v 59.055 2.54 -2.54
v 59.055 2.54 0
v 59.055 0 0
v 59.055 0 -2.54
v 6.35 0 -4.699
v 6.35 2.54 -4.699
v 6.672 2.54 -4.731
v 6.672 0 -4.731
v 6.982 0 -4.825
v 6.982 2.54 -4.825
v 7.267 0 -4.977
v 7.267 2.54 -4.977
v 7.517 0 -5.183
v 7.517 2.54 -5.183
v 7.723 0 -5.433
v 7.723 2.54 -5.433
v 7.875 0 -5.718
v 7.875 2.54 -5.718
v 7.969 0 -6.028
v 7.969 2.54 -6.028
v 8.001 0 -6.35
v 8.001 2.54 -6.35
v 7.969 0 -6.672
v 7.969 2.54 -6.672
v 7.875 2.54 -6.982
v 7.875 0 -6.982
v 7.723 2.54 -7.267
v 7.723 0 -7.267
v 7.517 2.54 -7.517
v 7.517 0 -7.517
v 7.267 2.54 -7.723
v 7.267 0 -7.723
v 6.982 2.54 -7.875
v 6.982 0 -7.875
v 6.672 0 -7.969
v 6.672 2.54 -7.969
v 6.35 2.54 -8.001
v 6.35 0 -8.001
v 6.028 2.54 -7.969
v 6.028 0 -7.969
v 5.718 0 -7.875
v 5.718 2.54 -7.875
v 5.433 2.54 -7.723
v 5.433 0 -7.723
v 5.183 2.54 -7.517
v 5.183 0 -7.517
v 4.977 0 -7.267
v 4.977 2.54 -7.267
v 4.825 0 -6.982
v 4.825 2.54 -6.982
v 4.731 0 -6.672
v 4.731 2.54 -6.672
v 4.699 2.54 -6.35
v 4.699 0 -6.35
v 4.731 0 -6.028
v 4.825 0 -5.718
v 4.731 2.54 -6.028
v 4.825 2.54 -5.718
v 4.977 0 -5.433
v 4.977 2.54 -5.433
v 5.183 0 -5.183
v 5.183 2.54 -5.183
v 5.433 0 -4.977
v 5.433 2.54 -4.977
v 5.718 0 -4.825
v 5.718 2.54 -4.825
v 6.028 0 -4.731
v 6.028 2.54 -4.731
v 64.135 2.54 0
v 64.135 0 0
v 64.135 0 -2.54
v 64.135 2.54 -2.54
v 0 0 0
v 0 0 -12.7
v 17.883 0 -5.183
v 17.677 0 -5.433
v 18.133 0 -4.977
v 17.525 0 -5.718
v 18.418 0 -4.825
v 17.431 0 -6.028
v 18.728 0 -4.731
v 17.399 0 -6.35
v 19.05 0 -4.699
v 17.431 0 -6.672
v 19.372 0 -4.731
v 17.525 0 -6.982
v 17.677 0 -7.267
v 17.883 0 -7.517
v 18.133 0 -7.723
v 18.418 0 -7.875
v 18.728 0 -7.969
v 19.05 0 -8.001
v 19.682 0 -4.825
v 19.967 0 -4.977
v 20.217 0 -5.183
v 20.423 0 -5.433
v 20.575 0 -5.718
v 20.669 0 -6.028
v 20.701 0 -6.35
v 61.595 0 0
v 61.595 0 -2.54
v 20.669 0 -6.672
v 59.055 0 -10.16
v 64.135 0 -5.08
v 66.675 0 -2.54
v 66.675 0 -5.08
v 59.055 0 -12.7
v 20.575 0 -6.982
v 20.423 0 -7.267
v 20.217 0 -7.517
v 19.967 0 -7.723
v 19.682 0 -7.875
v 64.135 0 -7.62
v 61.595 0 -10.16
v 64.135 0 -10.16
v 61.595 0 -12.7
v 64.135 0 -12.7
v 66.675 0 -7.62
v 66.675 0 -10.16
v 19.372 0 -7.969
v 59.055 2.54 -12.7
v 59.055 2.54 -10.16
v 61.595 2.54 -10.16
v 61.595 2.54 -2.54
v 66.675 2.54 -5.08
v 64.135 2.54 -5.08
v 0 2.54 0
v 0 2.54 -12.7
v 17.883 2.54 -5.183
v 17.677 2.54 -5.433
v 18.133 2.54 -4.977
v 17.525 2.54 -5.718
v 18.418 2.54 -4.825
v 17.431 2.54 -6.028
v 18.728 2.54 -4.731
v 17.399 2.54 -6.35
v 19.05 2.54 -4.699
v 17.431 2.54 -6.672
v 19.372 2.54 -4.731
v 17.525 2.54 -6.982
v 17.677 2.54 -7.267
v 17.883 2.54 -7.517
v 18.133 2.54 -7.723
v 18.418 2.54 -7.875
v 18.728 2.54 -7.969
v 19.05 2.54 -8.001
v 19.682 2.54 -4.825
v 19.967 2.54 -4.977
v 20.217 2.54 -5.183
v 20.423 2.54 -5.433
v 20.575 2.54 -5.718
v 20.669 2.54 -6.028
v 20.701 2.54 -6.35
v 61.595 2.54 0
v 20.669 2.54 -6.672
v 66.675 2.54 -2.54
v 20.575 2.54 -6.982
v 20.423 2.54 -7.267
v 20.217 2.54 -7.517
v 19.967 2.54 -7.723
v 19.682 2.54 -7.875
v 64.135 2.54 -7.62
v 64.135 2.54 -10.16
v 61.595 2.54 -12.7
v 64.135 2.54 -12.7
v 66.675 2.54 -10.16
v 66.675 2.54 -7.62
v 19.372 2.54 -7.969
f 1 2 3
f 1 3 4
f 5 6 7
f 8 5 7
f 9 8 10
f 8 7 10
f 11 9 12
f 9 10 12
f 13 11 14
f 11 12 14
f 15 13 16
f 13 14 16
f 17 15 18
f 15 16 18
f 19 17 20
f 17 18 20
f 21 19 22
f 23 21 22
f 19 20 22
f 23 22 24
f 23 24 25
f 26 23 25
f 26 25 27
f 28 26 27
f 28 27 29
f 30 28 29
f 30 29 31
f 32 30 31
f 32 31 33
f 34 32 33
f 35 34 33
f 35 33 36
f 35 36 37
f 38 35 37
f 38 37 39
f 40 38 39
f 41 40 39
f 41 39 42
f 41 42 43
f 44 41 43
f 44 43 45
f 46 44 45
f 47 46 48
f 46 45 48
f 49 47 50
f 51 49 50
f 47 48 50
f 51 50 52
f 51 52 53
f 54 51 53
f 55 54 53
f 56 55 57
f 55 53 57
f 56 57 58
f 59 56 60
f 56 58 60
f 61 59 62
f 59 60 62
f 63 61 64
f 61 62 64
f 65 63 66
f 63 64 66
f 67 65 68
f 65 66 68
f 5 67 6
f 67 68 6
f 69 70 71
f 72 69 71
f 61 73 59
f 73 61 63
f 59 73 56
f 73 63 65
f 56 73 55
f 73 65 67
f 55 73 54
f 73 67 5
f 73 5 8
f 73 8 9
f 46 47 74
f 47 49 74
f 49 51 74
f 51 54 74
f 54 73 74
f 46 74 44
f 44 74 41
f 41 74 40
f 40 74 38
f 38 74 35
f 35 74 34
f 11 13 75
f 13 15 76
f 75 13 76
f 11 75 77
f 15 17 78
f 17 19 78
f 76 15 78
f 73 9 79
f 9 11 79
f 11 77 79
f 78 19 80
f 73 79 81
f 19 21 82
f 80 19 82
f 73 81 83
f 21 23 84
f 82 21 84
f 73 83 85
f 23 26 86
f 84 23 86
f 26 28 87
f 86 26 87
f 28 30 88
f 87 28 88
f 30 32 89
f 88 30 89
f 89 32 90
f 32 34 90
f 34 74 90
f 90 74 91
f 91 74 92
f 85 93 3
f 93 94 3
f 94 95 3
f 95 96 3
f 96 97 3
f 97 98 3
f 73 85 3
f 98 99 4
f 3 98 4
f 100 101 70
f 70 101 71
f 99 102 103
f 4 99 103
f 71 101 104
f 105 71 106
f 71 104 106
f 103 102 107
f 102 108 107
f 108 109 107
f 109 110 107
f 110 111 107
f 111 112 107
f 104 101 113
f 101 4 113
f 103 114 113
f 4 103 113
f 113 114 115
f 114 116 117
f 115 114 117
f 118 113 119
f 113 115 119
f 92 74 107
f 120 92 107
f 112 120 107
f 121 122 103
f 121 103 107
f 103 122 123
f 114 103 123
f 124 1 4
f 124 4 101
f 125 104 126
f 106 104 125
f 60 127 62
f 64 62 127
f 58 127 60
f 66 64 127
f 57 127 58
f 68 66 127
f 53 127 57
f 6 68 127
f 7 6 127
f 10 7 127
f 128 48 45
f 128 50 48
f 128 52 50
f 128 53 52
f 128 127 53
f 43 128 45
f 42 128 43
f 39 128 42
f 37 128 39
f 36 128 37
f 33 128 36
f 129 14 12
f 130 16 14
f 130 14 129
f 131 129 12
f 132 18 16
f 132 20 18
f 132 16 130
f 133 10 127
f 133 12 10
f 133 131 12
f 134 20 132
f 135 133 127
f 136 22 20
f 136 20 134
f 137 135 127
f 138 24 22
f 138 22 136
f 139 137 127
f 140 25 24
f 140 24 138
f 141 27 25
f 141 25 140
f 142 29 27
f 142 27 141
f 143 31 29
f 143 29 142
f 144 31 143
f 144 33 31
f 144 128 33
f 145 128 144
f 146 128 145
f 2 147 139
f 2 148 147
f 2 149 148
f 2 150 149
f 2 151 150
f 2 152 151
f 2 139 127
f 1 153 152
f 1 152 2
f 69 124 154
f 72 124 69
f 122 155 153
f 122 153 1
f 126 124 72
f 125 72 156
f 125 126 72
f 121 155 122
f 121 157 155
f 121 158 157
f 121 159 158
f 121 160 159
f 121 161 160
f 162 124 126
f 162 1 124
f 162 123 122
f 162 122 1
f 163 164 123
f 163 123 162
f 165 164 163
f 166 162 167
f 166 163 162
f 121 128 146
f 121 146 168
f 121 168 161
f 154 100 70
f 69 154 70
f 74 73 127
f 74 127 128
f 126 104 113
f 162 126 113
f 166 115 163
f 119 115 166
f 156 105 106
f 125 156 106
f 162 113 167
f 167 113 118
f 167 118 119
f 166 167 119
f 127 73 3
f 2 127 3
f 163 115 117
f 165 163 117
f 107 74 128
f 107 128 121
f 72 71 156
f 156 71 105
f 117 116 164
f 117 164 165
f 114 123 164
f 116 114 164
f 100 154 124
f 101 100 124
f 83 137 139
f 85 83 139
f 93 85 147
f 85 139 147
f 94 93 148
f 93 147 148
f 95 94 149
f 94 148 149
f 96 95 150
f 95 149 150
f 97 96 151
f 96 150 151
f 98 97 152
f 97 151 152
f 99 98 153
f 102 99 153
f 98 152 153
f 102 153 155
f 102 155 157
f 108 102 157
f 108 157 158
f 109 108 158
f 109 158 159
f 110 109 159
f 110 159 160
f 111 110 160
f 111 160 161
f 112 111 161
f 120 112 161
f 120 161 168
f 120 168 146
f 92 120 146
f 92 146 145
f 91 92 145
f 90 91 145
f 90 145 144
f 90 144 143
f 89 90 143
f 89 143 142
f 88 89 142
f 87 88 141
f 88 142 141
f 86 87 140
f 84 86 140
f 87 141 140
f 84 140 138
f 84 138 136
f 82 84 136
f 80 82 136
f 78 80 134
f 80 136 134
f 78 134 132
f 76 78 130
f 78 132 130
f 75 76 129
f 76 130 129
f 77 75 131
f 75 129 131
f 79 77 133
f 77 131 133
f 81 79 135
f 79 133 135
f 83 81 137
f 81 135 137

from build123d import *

# Parameters (mm, degrees)
SKETCH1_W               = 66.675
SKETCH1_H               = 12.7
BOSS_EXTRUDE1_DEPTH     = 2.54
CUT_EXTRUDE1_DEPTH      = 1.27
CUT_EXTRUDE1_DEPTH_BACK = 68.921257534
SKETCH3_W               = 2.54
SKETCH3_H               = 2.54
SKETCH4_R               = 1.651
CUT_EXTRUDE2_DEPTH      = 68.921257534
SKETCH5_W               = 2.54
SKETCH5_H               = 2.54
CUT_EXTRUDE3_DEPTH      = 68.921257534


with BuildPart() as part:
    # Sketch1 → Boss-Extrude1 (new body)
    with BuildSketch(Plane(origin=(0, 0, 0), x_dir=(1, 0, 0), z_dir=(0, 1, 0))):
        with Locations((33.3375, 6.35)):
            Rectangle(SKETCH1_W, SKETCH1_H)
    extrude(amount=BOSS_EXTRUDE1_DEPTH)

    # Sketch3 → Cut-Extrude1 (cut, two sides: drawn at the far end of the back side and taken through both)
    with BuildSketch(Plane(origin=(0, 2.54, 0), x_dir=(1, 0, 0), z_dir=(0, 1, 0)).offset(-CUT_EXTRUDE1_DEPTH_BACK)):
        with Locations((65.405, 6.35)):
            Rectangle(SKETCH3_W, SKETCH3_H)
        with Locations((65.405, 11.43)):
            Rectangle(SKETCH3_W, SKETCH3_H)
        with Locations((65.405, 1.27)):
            Rectangle(SKETCH3_W, SKETCH3_H)
    extrude(amount=CUT_EXTRUDE1_DEPTH + CUT_EXTRUDE1_DEPTH_BACK, mode=Mode.SUBTRACT)

    # Sketch4 → Cut-Extrude2 (cut, through all)
    with BuildSketch(Plane(origin=(0, 2.54, 0), x_dir=(1, 0, 0), z_dir=(0, 1, 0))):
        with Locations((6.35, 6.35)):
            Circle(SKETCH4_R)
        with Locations((19.05, 6.35)):
            Circle(SKETCH4_R)
    extrude(amount=-CUT_EXTRUDE2_DEPTH, mode=Mode.SUBTRACT)

    # Sketch5 → Cut-Extrude3 (cut, through all)
    with BuildSketch(Plane(origin=(0, 2.54, 0), x_dir=(1, 0, 0), z_dir=(0, 1, 0))):
        with Locations((60.325, 1.27)):
            Rectangle(SKETCH5_W, SKETCH5_H)
        with Locations((60.325, 11.43)):
            Rectangle(SKETCH5_W, SKETCH5_H)
    extrude(amount=-CUT_EXTRUDE3_DEPTH, mode=Mode.SUBTRACT)


solid = part.part
